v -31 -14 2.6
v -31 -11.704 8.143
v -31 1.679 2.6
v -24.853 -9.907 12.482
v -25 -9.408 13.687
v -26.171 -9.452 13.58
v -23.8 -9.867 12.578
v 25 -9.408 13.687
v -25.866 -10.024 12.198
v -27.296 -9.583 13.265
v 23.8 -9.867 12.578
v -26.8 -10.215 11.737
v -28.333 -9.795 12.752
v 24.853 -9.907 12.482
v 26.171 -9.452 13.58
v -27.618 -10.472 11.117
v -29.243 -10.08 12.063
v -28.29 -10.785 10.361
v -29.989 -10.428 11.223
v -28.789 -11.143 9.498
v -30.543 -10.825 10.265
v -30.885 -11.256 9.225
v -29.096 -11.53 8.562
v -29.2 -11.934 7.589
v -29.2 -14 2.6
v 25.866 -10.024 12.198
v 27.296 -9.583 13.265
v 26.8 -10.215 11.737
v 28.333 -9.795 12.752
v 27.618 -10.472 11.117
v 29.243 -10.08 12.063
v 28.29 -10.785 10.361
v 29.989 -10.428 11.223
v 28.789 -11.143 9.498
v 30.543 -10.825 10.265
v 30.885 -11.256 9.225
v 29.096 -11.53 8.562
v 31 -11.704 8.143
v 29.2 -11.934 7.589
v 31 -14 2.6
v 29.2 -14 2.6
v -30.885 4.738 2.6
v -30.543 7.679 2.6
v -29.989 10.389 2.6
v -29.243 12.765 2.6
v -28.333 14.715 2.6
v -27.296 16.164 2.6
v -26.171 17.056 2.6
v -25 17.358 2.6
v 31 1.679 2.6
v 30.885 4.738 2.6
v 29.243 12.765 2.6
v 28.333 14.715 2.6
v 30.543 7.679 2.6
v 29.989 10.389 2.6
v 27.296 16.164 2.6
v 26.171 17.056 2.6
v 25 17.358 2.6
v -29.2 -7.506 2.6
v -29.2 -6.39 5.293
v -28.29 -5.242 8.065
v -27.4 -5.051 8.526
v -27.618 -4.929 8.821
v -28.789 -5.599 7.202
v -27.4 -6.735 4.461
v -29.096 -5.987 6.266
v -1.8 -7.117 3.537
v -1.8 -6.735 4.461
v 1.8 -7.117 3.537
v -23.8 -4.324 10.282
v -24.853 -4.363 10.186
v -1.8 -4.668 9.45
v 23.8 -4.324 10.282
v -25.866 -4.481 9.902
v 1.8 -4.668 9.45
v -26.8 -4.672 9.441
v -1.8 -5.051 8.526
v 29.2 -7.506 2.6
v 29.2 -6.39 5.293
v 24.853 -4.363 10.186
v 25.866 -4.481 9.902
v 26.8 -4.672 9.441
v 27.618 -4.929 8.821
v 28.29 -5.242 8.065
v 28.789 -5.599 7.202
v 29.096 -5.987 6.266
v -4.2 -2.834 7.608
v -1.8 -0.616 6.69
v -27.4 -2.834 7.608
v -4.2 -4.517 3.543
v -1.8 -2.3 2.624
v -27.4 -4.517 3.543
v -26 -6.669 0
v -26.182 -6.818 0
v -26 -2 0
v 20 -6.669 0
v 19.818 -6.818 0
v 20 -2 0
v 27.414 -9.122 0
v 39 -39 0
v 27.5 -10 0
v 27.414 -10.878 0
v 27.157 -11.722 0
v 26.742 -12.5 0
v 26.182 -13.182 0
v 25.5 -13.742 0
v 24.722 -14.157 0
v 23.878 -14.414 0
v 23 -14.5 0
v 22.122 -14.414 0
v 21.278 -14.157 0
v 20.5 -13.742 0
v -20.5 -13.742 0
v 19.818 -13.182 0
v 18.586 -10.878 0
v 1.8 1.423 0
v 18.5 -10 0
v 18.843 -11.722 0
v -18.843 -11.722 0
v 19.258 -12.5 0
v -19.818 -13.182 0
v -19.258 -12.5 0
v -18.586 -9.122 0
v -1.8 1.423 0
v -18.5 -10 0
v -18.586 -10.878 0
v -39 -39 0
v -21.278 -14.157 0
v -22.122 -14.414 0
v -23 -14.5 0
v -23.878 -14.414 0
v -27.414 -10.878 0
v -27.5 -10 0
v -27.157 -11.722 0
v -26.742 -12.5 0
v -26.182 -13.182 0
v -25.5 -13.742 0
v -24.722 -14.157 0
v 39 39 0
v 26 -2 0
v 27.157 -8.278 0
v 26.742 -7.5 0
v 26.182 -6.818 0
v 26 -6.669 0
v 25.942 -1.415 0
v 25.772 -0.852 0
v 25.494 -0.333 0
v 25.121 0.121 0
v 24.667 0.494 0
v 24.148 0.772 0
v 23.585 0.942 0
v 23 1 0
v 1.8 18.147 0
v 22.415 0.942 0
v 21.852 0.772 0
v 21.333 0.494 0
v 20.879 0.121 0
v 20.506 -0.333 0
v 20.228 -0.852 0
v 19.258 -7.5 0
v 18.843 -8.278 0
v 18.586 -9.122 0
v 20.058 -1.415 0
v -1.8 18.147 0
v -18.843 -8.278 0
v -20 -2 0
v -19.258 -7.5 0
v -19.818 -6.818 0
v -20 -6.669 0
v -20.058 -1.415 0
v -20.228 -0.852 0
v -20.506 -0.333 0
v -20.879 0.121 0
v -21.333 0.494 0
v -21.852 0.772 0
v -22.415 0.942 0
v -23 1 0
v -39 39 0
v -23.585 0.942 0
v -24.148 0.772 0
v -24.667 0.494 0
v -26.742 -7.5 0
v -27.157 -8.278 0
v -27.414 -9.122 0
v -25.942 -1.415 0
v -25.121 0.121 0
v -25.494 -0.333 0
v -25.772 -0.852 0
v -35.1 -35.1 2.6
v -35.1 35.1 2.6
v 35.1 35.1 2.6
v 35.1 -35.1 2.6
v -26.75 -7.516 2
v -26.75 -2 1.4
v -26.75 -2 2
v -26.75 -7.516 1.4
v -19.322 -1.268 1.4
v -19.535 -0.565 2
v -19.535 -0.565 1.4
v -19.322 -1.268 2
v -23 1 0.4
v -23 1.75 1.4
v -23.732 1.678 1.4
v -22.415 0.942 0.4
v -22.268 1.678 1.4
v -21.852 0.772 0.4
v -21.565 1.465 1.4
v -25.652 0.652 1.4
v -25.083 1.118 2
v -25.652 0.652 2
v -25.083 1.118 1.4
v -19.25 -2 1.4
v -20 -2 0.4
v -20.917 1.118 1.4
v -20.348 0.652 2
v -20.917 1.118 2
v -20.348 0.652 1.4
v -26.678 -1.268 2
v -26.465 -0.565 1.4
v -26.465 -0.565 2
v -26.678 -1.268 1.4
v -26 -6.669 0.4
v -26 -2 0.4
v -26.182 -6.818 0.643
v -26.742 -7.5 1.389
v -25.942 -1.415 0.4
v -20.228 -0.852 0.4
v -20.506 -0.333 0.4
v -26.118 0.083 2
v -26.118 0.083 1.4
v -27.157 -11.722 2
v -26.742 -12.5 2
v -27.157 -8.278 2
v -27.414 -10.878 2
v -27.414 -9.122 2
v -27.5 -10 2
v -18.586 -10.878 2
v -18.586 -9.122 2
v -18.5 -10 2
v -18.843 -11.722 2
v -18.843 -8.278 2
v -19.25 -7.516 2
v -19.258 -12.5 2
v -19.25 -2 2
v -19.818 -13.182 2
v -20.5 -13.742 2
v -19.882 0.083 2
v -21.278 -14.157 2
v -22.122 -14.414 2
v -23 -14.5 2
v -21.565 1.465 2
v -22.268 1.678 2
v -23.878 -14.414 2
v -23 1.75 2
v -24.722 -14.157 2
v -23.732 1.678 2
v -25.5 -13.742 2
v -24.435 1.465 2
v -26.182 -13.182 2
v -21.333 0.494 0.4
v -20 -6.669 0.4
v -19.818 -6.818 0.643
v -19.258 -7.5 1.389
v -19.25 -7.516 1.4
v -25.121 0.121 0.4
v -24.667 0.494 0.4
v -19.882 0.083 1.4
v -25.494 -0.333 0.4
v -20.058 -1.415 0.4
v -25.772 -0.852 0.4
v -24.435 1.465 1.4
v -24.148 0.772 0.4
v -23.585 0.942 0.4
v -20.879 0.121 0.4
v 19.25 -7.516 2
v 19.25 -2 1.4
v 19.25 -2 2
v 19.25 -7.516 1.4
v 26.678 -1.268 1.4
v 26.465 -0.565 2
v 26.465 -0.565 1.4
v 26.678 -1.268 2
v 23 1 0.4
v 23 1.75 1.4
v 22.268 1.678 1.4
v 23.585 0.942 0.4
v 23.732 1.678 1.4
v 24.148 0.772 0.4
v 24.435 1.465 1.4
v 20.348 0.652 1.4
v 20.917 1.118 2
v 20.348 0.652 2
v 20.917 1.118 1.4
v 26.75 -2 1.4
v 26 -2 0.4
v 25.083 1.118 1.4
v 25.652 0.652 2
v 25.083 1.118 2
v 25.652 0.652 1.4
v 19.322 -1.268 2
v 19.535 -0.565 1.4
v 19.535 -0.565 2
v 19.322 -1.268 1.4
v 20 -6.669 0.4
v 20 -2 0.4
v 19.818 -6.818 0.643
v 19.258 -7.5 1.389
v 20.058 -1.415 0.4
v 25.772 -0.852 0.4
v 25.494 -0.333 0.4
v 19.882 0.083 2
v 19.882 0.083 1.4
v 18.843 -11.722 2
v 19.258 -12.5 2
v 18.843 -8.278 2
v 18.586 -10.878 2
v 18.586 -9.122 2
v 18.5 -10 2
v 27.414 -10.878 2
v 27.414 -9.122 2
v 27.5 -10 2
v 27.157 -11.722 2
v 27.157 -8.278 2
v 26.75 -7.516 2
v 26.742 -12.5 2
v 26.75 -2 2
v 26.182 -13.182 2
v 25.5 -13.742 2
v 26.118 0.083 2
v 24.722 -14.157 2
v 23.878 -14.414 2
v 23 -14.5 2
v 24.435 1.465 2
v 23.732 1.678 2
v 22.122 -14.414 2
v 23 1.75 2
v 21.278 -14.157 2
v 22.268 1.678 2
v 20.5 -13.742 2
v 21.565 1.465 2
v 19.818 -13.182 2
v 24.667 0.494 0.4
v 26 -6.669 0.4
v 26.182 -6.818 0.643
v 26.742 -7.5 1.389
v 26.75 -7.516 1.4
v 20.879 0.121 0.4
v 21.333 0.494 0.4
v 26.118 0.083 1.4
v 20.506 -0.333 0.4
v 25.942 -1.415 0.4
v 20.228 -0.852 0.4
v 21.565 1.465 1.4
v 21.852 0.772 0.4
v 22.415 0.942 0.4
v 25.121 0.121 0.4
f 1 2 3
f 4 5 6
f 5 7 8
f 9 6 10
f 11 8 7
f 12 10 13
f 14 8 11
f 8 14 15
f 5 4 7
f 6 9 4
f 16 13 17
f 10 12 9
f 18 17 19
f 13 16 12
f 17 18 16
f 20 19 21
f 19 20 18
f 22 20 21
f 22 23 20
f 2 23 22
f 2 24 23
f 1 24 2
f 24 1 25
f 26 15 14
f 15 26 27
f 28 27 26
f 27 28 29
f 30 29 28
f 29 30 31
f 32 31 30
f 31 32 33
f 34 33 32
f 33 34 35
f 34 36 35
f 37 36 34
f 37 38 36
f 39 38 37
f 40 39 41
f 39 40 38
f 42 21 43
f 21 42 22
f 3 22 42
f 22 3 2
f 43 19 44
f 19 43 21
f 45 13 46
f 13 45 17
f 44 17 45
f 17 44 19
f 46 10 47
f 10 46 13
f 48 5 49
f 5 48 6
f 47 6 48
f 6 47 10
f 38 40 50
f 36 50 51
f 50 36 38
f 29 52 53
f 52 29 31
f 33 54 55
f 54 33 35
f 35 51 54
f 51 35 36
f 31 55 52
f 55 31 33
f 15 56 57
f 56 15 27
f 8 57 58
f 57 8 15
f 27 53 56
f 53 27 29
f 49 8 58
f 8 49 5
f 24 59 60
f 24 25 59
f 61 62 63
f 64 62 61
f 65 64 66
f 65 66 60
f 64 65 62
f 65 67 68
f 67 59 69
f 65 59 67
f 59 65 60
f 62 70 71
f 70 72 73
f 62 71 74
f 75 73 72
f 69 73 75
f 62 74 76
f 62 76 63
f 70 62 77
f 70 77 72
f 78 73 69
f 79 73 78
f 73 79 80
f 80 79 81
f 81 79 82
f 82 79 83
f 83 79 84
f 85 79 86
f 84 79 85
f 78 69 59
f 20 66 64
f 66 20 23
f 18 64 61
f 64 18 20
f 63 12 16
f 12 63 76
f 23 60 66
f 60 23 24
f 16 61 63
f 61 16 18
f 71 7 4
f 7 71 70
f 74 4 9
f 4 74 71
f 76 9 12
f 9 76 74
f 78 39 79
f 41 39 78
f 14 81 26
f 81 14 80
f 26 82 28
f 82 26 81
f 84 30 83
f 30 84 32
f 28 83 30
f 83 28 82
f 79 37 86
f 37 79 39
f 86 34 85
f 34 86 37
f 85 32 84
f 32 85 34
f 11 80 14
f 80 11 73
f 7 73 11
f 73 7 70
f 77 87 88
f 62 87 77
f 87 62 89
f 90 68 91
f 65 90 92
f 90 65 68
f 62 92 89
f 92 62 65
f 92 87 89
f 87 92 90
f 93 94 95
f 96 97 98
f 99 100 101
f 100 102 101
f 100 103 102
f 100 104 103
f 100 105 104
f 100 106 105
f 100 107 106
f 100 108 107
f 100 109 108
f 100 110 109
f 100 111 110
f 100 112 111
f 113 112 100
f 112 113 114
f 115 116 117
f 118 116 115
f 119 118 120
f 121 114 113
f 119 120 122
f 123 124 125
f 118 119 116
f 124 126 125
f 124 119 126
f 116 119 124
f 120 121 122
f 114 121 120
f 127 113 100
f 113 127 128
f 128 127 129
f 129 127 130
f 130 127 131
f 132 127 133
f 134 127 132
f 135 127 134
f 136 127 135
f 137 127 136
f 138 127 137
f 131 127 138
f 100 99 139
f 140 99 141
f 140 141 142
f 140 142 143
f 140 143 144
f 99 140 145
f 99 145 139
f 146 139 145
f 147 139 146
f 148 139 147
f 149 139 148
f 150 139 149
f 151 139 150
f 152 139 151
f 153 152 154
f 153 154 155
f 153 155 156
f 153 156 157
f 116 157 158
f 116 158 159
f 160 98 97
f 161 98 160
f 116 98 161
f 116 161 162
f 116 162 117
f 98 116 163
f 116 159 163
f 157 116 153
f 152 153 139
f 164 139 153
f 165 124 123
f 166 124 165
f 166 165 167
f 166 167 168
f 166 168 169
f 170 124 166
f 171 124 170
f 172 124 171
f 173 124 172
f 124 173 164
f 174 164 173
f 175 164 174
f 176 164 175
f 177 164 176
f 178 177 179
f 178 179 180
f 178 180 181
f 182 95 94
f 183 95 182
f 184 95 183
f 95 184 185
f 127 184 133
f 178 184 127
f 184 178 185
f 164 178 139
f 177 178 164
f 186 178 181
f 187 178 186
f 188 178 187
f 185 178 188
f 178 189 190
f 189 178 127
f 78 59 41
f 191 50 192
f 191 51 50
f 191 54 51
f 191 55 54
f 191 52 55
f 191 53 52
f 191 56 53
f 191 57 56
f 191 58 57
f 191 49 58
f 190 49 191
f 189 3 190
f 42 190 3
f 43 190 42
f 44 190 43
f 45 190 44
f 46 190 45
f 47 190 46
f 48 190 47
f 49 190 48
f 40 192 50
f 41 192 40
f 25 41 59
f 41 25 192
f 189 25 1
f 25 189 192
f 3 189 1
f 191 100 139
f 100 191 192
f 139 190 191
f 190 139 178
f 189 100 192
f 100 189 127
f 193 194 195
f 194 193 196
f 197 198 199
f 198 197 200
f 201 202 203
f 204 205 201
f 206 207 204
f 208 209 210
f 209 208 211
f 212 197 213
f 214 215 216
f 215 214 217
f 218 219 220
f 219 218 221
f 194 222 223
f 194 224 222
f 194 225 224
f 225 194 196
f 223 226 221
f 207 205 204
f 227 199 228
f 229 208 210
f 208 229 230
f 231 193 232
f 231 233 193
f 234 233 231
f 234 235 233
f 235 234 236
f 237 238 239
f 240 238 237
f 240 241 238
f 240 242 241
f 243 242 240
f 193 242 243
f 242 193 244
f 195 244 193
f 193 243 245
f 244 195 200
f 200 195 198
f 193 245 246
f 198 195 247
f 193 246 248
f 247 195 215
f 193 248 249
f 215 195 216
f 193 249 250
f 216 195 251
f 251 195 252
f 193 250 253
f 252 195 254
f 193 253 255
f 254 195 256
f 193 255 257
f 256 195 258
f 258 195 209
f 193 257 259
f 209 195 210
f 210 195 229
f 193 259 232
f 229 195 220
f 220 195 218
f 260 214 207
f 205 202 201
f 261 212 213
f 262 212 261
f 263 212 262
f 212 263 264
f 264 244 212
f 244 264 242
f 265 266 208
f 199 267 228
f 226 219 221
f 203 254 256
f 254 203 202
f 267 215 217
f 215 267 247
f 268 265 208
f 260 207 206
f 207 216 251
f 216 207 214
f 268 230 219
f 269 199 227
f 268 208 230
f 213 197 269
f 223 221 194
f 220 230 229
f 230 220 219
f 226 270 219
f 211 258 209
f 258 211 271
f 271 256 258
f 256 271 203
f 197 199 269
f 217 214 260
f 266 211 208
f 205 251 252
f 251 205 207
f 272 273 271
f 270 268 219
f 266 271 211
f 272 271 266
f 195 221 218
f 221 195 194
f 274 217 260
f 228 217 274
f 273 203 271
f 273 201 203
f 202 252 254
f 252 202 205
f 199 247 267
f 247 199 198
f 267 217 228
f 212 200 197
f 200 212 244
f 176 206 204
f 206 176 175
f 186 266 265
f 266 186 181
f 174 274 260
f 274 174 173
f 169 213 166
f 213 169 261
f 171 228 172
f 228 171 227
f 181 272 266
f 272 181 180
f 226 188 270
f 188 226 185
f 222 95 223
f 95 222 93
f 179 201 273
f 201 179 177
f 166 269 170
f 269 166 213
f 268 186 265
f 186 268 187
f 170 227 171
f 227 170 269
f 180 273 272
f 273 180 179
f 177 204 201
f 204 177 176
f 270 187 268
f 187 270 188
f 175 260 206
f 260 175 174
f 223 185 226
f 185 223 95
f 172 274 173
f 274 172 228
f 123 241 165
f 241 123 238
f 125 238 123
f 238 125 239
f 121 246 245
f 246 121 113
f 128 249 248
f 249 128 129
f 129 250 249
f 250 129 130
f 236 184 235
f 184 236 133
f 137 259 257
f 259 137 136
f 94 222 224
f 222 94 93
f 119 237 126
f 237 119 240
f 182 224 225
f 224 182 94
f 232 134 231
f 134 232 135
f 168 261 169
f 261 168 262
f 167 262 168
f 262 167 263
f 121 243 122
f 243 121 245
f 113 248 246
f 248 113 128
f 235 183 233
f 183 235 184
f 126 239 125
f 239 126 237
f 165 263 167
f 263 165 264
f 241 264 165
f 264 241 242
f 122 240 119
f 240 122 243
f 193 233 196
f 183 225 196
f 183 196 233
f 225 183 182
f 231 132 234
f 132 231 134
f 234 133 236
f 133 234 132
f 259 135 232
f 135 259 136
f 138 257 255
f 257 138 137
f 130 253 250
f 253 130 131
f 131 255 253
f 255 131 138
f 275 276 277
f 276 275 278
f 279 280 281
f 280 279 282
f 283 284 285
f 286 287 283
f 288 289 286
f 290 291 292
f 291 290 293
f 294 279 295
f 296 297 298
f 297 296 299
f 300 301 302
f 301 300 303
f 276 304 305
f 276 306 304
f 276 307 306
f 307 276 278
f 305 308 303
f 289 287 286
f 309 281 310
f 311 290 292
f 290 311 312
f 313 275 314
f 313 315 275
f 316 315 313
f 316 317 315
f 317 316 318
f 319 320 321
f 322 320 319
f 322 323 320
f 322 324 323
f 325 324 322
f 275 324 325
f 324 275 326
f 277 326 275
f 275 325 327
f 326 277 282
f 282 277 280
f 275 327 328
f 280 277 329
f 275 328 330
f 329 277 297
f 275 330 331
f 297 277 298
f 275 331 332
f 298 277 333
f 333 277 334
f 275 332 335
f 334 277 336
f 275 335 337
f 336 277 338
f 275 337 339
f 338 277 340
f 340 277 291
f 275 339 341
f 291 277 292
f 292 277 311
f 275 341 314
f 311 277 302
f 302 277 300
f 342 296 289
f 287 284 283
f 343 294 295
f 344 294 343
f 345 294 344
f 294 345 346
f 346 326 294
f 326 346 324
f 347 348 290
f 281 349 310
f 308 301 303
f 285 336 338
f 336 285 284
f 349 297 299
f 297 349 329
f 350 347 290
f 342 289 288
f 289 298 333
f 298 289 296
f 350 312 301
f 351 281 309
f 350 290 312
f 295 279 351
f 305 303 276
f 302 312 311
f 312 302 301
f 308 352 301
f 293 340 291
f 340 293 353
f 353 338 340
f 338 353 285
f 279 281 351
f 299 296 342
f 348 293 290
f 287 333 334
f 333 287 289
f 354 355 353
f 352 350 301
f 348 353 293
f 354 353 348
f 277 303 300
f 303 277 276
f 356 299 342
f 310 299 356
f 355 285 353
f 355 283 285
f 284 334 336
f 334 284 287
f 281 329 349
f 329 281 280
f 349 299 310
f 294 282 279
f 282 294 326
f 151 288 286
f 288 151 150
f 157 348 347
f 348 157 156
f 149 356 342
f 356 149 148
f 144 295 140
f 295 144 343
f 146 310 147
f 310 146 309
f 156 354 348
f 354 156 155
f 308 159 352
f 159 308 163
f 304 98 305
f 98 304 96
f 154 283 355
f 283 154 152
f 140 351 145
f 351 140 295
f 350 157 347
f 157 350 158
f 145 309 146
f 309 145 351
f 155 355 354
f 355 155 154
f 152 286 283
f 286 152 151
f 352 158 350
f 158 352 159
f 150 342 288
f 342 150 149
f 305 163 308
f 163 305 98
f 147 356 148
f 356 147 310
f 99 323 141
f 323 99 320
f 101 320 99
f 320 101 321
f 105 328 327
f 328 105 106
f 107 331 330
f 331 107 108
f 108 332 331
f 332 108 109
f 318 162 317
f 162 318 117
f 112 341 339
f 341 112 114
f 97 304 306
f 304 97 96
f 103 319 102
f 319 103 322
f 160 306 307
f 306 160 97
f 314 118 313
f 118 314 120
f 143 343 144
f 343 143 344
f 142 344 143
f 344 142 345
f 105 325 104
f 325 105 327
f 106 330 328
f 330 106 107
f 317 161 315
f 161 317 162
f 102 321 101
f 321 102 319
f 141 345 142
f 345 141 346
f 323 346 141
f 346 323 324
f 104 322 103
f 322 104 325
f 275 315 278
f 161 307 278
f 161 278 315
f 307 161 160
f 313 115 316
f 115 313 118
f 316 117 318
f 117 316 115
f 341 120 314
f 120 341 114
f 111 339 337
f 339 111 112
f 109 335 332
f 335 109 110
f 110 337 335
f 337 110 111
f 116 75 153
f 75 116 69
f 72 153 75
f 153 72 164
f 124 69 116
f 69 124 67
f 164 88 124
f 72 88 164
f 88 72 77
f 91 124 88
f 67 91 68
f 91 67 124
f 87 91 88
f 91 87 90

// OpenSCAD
useHeartBase=false;

length=78;
baseThickness=2.6;
wallThickness=1.2;

lightHolderLength=50;
lightHolderWidth=40;
lightHolderHeight=12;
lightHolderOffsetY=-14;
lightHoleWidth=6;
lightHolderAngle=-22.5;

screwDistanceX=46;
screwHoleOffsetY=-2;

screwHeadDiameter=7.5;
screwHeadBigDiameter=9;
screwDiameter=6;
screwHolderThickness=0.4;
screwHoleConeThickness=1.0;
screwHoleThickness=0.6;
screwHoleLength=8;

heartLength=60;
heartDiagonal=heartLength*sqrt(2);
heartOffsetY=-5;

wiresHoleWidth=4.4;
wiresHoleHeight=2.4;
wiresHoleOffsetX=-lightHolderHeight/2+3*wallThickness;
wiresHoleLength=-wiresHoleOffsetX+lightHolderLength/2;
wiresConnectorWidth=6.4;
wiresConnectorHeight=3.6;
lightHolderCenterZ=(lightHolderHeight-wallThickness)/2+1.30;

epsilon=0.000000000000000000000001;


module squareBase()
{
	linear_extrude(baseThickness,scale=0.9)
	translate([-length/2,-length/2])
	square(length);
}

module heart2D(){
  square(heartLength);

  translate([heartLength/2,heartLength,0])
  circle(heartLength/2,$fn=64);

  translate([heartLength,heartLength/2,0])
  circle(heartLength/2,$fn=64);
}

module heartBase(){
	translate([0,heartOffsetY,0])
	linear_extrude(baseThickness,scale=0.9)
	{
		translate([0,-heartDiagonal/2-10])
		rotate(45)
		heart2D();
	}
}


module cubeRounded(x,y,h)
{
	h2=h/2;
	cube([x,y,h]);
	
	for (t=[[-h2,0],[x,x]]) 
	{
		translate([t[0],0,0])
		cube([h2,y,h2]);
		
		translate([t[1],0,h2])
		rotate([-90,0,0])
		cylinder(d=h,h=y,$fn=32);
	}
}

module screwHole(t)
{
	h=screwHolderThickness+screwHoleConeThickness+screwHoleThickness;
	translate([0,-screwHoleLength,0])
	union()
	{
		minkowski()
		{
			union()
			{
				cylinder(d=screwDiameter,h=screwHolderThickness,$fn=32);
				
				translate([0,0,screwHolderThickness])
				cylinder(d1=screwDiameter,d2=screwHeadDiameter,h=screwHoleConeThickness,$fn=32);
				
				translate([0,0,screwHolderThickness+screwHoleConeThickness])
				cylinder(d=screwHeadDiameter,h=screwHoleThickness,$fn=32);
			}
			
			cube([epsilon,screwHoleLength,epsilon]);
		}
		
		cylinder(d=screwHeadBigDiameter,h=h,$fn=32);
	}
}

module screwHoleTest()
{
	difference()
	{
		translate([-33,-15,0])
		cube([66,20,1.8]);
		
		for(t=[-1,0,1])
		{
			translate([t*screwDistanceX/2,0,0])
			screwHole(t);
		}
	}
}

difference()
{
	union()
	{
		if (useHeartBase) {
			heartBase();
		} else {
			squareBase();
		}
		
		translate([-lightHolderLength/2,lightHolderOffsetY,baseThickness])
		rotate([lightHolderAngle,0,0])
		difference()
		{
			cubeRounded(lightHolderLength,lightHolderWidth,lightHolderHeight);
			
			translate([wallThickness,-1,0])
			cubeRounded(lightHolderLength-2*wallThickness,lightHoleWidth+1,lightHolderHeight-wallThickness);
			
			translate([wiresHoleOffsetX,lightHoleWidth-1,lightHolderCenterZ-wiresHoleWidth/2])
			cube([wiresHoleLength,wiresHoleHeight+1,wiresHoleWidth]);
		}
	}
	
	translate([-length/2,-length/2,-length])
	cube([length,length,length]);
	
	for(t=[-1,1])
	{
		translate([t*screwDistanceX/2,screwHoleOffsetY,0])
		screwHole();
	}
	
	translate([0,lightHolderOffsetY,baseThickness])
	rotate([lightHolderAngle,0,0])
	union()
	{
		translate([-wiresConnectorHeight/2,lightHoleWidth-1,lightHolderCenterZ-wiresConnectorWidth/2])
		cube([wiresConnectorHeight,length,wiresConnectorWidth]);
		
		translate([-wiresConnectorHeight/2-wiresHoleHeight,lightHoleWidth+wiresHoleHeight-1,lightHolderCenterZ-wiresHoleWidth/2])
		linear_extrude(wiresHoleWidth)
		polygon([
			[0,0],
			[0,1],
			[wiresHoleHeight,wiresHoleHeight+1],
			[2*wiresHoleHeight,wiresHoleHeight+1],
			[2*wiresHoleHeight,0],
		]);
	}
		
}
